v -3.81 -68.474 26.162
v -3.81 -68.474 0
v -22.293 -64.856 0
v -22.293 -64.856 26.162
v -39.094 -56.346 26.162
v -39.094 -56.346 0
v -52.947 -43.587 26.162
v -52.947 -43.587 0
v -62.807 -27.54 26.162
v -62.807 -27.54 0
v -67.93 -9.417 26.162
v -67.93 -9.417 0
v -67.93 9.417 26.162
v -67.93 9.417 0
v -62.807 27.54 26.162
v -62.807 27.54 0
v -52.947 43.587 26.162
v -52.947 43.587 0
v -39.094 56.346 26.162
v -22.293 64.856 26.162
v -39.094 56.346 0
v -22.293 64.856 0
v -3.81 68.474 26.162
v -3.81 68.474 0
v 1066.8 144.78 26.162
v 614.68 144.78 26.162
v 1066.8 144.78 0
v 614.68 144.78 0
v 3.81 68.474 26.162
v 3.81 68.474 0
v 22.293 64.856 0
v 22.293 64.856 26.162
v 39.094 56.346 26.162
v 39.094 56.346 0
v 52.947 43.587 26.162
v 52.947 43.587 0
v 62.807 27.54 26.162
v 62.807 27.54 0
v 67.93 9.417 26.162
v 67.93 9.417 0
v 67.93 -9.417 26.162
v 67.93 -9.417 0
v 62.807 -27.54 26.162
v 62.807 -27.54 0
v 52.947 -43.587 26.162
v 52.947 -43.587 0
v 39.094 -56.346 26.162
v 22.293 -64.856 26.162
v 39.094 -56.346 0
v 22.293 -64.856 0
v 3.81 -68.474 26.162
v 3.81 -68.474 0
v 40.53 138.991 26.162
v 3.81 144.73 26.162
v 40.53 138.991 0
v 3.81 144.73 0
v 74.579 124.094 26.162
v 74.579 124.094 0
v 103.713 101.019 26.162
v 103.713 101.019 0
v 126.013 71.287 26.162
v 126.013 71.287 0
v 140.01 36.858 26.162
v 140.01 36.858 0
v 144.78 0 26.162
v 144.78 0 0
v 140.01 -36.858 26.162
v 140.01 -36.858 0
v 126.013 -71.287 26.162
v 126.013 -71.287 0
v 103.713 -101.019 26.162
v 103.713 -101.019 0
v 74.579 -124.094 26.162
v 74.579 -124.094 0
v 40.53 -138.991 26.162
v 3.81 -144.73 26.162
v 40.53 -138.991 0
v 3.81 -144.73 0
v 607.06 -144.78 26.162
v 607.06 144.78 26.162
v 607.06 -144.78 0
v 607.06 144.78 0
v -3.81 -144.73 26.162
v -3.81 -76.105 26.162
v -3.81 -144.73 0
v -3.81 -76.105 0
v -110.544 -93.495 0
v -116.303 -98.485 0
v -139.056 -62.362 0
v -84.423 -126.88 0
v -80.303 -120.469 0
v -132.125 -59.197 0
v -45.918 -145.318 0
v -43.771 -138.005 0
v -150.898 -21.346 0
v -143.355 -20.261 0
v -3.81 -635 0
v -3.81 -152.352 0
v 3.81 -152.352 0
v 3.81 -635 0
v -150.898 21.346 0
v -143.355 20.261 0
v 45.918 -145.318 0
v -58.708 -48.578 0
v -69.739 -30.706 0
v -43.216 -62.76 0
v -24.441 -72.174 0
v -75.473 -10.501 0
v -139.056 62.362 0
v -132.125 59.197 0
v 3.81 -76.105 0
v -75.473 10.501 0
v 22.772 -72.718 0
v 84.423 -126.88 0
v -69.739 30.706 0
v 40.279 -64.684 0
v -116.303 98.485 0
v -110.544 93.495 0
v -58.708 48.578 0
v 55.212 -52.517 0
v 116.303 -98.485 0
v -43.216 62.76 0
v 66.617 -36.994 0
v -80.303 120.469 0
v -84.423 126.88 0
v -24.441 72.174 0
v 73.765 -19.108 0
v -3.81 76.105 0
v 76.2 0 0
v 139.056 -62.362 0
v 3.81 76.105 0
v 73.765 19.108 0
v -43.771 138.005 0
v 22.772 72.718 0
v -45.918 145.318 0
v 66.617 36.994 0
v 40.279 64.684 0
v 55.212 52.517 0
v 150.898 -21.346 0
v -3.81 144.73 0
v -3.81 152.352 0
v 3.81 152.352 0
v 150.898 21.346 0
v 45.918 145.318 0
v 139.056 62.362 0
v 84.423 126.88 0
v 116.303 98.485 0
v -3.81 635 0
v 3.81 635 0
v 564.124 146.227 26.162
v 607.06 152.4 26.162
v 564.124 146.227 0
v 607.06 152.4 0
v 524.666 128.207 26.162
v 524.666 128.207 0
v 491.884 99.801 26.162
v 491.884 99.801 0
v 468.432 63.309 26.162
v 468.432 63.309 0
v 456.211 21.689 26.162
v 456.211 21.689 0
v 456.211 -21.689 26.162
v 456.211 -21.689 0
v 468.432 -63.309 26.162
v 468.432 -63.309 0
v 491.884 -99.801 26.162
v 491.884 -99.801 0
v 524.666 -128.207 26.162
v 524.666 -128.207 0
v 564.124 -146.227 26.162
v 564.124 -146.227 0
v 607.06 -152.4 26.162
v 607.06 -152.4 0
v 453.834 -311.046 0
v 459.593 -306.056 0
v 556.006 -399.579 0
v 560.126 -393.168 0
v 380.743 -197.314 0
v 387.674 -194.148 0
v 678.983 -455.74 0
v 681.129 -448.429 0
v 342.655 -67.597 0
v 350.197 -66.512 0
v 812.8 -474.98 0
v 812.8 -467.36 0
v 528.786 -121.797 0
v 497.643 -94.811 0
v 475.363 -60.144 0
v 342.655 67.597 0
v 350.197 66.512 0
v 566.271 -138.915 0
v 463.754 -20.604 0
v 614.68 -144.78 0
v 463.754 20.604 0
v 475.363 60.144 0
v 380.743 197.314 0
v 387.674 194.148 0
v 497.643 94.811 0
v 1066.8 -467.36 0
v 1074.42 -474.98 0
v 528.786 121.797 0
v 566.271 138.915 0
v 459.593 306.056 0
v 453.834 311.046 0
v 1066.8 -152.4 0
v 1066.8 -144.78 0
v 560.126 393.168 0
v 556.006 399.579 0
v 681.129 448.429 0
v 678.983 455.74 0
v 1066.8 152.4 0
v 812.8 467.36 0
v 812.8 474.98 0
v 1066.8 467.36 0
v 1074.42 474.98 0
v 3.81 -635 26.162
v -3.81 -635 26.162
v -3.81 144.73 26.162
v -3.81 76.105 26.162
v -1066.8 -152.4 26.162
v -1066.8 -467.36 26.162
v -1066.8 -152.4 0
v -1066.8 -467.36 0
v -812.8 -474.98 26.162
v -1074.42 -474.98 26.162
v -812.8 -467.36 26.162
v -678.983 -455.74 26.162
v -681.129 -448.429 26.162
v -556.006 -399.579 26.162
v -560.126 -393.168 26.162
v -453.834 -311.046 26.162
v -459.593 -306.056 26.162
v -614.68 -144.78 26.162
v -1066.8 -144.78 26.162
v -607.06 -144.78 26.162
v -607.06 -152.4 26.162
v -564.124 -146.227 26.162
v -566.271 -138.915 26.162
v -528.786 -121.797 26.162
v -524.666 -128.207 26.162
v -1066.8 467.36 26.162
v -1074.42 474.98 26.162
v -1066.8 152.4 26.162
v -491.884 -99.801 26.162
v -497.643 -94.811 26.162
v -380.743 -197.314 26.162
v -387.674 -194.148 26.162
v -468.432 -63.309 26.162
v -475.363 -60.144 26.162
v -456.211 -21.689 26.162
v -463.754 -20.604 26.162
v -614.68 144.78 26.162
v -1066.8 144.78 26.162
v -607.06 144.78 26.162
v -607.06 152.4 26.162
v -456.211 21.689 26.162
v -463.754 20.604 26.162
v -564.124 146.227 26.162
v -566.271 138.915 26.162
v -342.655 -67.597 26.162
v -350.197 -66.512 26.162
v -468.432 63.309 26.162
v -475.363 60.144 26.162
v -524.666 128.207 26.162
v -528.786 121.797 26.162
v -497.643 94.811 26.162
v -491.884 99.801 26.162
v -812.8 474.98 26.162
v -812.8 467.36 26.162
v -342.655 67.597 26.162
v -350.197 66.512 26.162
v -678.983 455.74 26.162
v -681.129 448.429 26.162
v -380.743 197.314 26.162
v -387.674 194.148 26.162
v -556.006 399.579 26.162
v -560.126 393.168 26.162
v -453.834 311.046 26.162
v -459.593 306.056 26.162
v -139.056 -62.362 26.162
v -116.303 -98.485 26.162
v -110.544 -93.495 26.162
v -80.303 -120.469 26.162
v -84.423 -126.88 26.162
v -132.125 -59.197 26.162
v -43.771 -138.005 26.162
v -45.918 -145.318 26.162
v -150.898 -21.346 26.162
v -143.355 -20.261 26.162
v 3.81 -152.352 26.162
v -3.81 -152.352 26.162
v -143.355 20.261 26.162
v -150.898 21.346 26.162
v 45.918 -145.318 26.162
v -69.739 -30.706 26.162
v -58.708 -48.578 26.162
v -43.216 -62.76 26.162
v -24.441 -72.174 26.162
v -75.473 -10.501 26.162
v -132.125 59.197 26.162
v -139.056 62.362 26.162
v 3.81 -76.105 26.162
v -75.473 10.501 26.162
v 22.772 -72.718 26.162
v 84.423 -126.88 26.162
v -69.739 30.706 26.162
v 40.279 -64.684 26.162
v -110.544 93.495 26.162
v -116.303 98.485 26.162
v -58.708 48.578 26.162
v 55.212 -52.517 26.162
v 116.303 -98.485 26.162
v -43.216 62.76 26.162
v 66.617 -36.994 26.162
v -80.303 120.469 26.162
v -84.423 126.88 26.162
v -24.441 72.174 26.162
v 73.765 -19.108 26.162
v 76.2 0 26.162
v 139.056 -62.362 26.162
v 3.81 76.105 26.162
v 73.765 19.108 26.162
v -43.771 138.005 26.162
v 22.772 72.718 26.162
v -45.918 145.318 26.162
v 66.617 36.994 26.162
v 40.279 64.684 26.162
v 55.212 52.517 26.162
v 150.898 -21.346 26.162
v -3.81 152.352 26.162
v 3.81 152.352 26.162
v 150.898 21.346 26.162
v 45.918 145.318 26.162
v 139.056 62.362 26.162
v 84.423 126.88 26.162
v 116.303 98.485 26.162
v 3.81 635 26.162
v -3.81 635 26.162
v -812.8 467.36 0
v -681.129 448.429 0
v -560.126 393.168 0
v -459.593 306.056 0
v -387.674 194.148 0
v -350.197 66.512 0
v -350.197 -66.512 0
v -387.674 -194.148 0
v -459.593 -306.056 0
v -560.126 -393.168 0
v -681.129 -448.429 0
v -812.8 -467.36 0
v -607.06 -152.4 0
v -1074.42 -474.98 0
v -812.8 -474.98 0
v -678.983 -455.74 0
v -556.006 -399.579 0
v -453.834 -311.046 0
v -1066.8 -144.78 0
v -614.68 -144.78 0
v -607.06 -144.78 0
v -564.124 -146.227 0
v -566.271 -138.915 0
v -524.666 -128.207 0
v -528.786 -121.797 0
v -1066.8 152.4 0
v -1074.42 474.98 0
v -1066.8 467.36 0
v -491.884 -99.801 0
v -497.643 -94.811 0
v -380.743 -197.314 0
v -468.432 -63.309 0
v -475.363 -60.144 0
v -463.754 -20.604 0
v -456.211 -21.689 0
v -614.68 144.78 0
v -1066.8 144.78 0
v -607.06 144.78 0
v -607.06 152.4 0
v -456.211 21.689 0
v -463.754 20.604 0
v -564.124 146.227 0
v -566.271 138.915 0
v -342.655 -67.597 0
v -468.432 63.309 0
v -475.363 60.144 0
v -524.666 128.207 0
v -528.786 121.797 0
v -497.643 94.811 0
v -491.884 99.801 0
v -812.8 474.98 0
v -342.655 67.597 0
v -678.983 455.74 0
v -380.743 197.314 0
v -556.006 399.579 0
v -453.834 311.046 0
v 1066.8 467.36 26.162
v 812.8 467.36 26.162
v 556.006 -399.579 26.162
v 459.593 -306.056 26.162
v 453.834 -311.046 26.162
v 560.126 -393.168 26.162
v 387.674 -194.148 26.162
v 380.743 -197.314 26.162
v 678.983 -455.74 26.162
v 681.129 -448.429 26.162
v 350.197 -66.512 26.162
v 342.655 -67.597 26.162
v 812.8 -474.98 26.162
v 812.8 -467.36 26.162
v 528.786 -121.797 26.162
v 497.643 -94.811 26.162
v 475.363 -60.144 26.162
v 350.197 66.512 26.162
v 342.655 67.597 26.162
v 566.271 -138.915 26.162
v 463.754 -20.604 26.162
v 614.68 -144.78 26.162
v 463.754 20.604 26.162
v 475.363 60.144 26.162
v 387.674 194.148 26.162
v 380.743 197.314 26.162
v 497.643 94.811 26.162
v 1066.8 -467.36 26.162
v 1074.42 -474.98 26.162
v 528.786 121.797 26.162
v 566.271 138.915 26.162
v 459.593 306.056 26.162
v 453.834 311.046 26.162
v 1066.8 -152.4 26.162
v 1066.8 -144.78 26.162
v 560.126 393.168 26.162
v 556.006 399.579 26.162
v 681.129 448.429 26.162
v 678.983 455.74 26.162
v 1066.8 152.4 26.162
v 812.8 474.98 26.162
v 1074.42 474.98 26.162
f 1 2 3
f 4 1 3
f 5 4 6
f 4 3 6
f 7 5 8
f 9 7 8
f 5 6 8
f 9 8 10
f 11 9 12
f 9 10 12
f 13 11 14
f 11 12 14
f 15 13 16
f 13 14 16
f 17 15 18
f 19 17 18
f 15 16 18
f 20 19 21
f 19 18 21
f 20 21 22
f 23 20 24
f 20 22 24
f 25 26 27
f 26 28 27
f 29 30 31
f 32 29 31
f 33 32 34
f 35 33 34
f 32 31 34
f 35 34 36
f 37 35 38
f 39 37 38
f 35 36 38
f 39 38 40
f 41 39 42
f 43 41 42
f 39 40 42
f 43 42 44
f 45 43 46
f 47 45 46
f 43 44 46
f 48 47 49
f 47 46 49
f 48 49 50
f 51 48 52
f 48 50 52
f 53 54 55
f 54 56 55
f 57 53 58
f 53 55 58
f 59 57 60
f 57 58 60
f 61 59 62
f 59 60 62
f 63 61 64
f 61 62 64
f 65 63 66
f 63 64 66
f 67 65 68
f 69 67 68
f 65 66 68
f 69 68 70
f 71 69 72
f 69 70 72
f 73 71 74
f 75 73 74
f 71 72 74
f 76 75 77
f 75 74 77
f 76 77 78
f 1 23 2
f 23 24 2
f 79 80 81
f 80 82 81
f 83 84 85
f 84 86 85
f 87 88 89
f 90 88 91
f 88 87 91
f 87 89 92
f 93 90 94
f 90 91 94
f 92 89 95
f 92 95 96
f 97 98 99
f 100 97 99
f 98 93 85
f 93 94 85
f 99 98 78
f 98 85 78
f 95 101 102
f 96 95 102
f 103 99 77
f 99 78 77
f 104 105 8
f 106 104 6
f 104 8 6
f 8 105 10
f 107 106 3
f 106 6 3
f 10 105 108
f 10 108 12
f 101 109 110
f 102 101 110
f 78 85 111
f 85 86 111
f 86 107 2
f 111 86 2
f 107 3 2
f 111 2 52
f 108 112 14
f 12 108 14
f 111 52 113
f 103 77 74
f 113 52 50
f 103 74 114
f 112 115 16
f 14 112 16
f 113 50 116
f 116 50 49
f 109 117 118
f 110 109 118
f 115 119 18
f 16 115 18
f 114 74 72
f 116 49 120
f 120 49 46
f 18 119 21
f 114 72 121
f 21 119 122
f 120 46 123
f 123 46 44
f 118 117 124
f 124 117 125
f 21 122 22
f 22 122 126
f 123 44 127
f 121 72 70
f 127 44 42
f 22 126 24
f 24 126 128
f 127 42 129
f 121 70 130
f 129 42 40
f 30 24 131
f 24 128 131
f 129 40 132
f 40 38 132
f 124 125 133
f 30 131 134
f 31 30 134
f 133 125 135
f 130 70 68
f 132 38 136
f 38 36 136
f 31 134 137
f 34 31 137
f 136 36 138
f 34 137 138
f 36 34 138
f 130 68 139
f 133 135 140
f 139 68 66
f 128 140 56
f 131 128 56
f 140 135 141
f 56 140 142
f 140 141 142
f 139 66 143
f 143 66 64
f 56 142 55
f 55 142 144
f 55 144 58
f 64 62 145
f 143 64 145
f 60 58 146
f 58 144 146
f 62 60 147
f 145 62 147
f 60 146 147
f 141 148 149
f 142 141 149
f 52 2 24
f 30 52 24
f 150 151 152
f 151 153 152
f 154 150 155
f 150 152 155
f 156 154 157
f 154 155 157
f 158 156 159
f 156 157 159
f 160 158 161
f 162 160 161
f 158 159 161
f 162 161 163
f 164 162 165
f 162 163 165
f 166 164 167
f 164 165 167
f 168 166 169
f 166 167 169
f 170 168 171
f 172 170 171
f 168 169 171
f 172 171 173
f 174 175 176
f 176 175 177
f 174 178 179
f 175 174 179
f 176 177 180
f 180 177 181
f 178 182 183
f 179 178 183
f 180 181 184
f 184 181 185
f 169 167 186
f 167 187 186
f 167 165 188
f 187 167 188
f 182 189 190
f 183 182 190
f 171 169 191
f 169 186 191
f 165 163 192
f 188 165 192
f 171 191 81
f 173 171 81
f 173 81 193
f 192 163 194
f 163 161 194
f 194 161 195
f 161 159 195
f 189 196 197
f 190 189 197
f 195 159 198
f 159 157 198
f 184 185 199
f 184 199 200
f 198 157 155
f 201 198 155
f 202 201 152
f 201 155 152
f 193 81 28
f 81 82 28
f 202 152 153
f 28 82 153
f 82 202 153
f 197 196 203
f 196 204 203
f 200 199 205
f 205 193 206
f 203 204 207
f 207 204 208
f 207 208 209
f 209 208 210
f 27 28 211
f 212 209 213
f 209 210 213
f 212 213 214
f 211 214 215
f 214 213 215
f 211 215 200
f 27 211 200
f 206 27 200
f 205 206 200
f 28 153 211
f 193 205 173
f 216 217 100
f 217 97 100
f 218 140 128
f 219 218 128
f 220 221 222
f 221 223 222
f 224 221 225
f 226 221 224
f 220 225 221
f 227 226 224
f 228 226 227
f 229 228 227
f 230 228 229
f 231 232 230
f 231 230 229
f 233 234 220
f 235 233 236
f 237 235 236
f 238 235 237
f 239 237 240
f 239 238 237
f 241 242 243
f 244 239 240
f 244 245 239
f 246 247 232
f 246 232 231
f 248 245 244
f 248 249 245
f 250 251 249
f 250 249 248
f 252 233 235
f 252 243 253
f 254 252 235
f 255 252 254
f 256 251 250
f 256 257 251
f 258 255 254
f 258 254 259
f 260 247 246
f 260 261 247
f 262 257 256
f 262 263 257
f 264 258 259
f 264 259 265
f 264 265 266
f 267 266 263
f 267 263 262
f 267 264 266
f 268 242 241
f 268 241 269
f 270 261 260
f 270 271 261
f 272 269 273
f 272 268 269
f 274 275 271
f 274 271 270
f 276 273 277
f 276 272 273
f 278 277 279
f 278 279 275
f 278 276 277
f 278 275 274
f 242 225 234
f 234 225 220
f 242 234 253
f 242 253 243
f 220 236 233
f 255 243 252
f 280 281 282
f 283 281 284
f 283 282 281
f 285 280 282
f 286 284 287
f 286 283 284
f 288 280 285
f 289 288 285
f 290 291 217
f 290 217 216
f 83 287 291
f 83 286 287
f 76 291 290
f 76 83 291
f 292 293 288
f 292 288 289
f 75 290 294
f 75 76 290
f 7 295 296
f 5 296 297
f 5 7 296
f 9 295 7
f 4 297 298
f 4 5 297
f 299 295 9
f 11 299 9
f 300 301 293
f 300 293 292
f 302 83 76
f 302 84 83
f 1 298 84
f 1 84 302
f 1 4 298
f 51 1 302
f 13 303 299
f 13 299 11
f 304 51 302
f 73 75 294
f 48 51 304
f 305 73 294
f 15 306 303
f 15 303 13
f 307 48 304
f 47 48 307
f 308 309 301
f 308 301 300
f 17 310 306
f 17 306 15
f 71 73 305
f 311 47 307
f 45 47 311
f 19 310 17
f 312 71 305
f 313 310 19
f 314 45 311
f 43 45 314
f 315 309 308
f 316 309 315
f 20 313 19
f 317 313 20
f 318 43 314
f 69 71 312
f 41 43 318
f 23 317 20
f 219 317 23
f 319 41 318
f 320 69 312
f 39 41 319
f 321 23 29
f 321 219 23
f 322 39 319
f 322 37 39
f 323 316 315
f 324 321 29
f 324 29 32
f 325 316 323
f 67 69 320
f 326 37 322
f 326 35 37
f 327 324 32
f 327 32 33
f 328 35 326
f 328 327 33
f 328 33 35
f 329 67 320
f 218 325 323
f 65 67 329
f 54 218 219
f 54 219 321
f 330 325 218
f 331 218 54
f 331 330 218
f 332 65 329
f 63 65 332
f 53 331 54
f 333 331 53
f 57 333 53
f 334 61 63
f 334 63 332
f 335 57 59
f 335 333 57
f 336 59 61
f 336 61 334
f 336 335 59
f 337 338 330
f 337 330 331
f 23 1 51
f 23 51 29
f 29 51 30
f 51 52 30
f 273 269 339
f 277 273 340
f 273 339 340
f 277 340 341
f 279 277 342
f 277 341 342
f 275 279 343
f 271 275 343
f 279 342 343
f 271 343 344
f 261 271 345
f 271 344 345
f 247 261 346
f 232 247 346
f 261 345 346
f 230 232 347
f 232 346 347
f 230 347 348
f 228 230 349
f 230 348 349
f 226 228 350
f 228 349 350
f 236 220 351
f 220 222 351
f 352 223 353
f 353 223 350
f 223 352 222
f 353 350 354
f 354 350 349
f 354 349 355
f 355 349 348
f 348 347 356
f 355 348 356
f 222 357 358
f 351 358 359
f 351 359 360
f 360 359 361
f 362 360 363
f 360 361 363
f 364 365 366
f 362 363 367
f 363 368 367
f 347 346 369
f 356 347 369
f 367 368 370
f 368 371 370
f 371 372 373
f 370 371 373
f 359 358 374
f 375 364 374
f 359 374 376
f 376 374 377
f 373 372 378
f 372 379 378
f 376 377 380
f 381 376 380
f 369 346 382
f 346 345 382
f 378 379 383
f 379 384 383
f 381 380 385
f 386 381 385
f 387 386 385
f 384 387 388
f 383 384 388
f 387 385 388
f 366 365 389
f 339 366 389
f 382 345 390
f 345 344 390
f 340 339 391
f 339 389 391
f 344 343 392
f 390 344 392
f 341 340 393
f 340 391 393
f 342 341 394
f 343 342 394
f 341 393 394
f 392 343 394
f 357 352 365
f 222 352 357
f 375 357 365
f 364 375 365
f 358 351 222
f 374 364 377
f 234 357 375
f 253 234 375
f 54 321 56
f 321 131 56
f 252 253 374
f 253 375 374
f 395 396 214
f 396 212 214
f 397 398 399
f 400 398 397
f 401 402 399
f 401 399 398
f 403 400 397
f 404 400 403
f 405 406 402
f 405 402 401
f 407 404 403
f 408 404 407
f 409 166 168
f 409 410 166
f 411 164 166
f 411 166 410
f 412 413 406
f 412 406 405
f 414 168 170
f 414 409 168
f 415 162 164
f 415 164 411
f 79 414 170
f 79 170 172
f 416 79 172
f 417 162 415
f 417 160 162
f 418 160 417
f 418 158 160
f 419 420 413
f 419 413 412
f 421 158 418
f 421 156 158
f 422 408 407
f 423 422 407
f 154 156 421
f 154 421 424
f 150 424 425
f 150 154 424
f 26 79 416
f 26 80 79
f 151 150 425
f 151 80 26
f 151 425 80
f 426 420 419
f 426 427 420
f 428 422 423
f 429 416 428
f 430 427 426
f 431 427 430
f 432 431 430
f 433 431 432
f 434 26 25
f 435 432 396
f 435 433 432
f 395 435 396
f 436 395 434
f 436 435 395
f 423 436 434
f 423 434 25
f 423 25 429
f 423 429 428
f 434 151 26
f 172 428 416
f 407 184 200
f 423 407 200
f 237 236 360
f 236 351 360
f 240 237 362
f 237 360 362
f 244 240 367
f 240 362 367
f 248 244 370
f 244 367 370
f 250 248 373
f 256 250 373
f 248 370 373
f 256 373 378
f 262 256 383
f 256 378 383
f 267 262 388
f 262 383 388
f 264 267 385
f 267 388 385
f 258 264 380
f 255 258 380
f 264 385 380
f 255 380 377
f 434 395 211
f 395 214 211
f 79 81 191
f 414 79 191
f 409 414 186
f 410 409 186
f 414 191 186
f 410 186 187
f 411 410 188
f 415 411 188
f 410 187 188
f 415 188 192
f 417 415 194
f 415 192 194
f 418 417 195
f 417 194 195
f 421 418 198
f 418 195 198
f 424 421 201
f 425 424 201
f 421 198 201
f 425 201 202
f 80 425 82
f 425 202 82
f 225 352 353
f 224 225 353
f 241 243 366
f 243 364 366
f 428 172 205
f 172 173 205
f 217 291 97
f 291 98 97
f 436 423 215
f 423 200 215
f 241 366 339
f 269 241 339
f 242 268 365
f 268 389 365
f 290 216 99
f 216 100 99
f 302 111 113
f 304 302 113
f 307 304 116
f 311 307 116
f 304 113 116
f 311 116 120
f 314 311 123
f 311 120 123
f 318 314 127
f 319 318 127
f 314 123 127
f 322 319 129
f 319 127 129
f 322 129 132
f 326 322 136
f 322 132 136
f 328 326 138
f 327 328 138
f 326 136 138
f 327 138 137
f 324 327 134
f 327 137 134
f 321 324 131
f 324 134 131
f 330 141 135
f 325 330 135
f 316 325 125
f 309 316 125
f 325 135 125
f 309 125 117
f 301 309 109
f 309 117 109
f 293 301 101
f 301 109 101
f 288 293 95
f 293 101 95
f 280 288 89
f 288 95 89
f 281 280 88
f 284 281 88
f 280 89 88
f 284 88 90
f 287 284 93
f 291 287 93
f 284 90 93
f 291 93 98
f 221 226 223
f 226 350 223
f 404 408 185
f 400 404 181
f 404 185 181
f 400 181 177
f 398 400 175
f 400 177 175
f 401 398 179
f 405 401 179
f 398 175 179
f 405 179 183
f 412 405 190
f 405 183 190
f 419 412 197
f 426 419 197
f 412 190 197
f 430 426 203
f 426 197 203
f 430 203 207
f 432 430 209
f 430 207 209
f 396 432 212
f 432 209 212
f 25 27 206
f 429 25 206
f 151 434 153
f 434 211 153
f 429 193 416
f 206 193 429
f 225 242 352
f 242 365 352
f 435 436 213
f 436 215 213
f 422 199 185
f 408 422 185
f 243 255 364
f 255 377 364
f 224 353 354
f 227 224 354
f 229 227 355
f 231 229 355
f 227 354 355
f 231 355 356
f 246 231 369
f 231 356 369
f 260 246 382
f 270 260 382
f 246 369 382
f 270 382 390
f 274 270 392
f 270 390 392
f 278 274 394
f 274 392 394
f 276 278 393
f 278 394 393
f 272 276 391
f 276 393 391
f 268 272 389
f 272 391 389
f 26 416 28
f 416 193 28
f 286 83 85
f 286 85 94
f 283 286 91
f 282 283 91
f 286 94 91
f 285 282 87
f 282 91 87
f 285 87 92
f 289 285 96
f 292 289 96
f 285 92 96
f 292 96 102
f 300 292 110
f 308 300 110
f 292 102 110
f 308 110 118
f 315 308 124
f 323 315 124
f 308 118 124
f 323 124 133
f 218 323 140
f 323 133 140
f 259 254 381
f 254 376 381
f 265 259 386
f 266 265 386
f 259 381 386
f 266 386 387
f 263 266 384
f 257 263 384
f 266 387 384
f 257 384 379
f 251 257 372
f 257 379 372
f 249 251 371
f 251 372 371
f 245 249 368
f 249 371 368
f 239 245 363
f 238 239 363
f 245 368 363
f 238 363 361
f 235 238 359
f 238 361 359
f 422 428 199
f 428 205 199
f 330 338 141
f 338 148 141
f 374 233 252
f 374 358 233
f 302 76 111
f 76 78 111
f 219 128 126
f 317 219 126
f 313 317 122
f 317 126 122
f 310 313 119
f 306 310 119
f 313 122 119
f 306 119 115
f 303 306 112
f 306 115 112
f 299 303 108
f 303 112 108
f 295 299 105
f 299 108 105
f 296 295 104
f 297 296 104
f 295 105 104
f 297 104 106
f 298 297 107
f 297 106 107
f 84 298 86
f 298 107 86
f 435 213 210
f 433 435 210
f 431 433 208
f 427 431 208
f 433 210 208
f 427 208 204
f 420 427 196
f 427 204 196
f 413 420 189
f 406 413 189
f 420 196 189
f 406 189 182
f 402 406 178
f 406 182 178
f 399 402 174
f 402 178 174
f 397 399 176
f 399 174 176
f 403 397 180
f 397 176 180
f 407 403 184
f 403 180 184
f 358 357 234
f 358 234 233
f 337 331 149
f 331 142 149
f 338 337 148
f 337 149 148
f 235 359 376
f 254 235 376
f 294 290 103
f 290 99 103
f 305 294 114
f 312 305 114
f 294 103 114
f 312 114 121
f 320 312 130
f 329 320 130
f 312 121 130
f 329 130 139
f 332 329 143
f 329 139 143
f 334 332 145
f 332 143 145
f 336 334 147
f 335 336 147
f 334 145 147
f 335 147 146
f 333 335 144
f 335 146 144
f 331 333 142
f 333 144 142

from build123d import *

# Parameters (mm, degrees)
F0_W     = 254
F0_H     = 7.62
F0_W_2   = 7.62
F0_H_2   = 289.56
F0_W_3   = 452.12
F1_DEPTH = 0.762
F2_DEPTH = 25.4
F3_DEPTH = 25.4
F4_DEPTH = 25.4


with BuildPart() as f1:
    # F0 (on Top) → F1 (new body)
    with BuildSketch(Plane.XY):
        with BuildLine():
            Line((-1066.8, -467.36), (-1066.8, -474.98))
            Line((-1066.8, -474.98), (-812.8, -474.98))
            ThreePointArc((-812.8, -474.98), (-337.82, 0), (-812.8, 474.98))
            Line((-812.8, 474.98), (-812.8, 467.36))
            ThreePointArc((-812.8, 467.36), (-345.44, 0), (-812.8, -467.36))
            Line((-812.8, -467.36), (-1066.8, -467.36))
        make_face()
        with Locations((-939.8, 471.17)):
            Rectangle(F0_W, F0_H)
        with Locations((-610.87, 0)):
            Rectangle(F0_W_2, F0_H_2)
        with Locations((-840.74, 148.59)):
            Rectangle(F0_W_3, F0_H)
        with Locations((-610.87, 148.59)):
            Rectangle(F0_W_2, F0_H)
        with BuildLine():
            Line((-607.06, -144.78), (-607.06, -152.4))
            ThreePointArc((-607.06, -152.4), (-454.66, 0), (-607.06, 152.4))
            Line((-607.06, 152.4), (-607.06, 144.78))
            ThreePointArc((-607.06, 144.78), (-462.28, 0), (-607.06, -144.78))
        make_face()
        with Locations((-840.74, -148.59)):
            Rectangle(F0_W_3, F0_H)
        with Locations((-610.87, -148.59)):
            Rectangle(F0_W_2, F0_H)
        Polygon((-1074.42, -474.98), (-1066.8, -474.98), (-1066.8, -467.36), (-1066.8, -152.4), (-1066.8, -144.78), (-1066.8, 144.78), (-1066.8, 152.4), (-1066.8, 467.36), (-1066.8, 474.98), (-1074.42, 474.98), align=None)
    extrude(amount=F1_DEPTH)

    # F2 (add): a face of the model
    f2_faces = [f1.faces().sort_by_distance(p)[0] for p in [
        (-939.8, -468.5620830094, 0.762),
    ]]
    extrude(f2_faces, amount=F2_DEPTH)


with BuildPart() as f1b:
    # F0 (on Top) → F1, piece 2 (new body)
    with BuildSketch(Plane.XY):
        with BuildLine():
            ThreePointArc((-3.81, 76.1046903942), (-76.2, 0), (-3.81, -76.1046903942))
            Line((-3.81, -76.1046903942), (-3.81, -68.4740848789))
            ThreePointArc((-3.81, -68.4740848789), (-68.58, 0), (-3.81, 68.4740848789))
            Line((-3.81, 68.4740848789), (-3.81, 76.1046903942))
        make_face()
        with BuildLine():
            Line((3.81, -68.4740848789), (3.81, -76.1046903942))
            ThreePointArc((3.81, -76.1046903942), (55.212145403, -52.5172257455), (76.2, 0))
            ThreePointArc((76.2, 0), (55.212145403, 52.5172257455), (3.81, 76.1046903942))
            Line((3.81, 76.1046903942), (3.81, 68.4740848789))
            ThreePointArc((3.81, 68.4740848789), (49.8222149247, 47.1270973008), (68.58, 0))
            ThreePointArc((68.58, 0), (49.8222149247, -47.1270973008), (3.81, -68.4740848789))
        make_face()
        with BuildLine():
            ThreePointArc((3.81, 76.1046903942), (1.9055959646, 76.176168872), (0, 76.2))
            Line((0, 76.2), (0, 68.58))
            ThreePointArc((0, 68.58), (1.9057359479, 68.553516106), (3.81, 68.4740848789))
            Line((3.81, 68.4740848789), (3.81, 76.1046903942))
        make_face()
        with BuildLine():
            ThreePointArc((0, 76.2), (-1.9055959646, 76.176168872), (-3.81, 76.1046903942))
            Line((-3.81, 76.1046903942), (-3.81, 68.4740848789))
            ThreePointArc((-3.81, 68.4740848789), (-1.9057359479, 68.553516106), (0, 68.58))
            Line((0, 68.58), (0, 76.2))
        make_face()
        with BuildLine():
            ThreePointArc((-3.81, 152.3523675563), (-152.4, 0), (-3.81, -152.3523675563))
            Line((-3.81, -152.3523675563), (-3.81, -144.7298597388))
            ThreePointArc((-3.81, -144.7298597388), (-144.78, 0), (-3.81, 144.7298597388))
            Line((-3.81, 144.7298597388), (-3.81, 152.3523675563))
        make_face()
        with BuildLine():
            ThreePointArc((0, 152.4), (-1.9051488688, 152.3880914238), (-3.81, 152.3523675563))
            Line((-3.81, 152.3523675563), (-3.81, 144.7298597388))
            ThreePointArc((-3.81, 144.7298597388), (-1.9051649565, 144.767464392), (0, 144.78))
            Line((0, 144.78), (0, 152.4))
        make_face()
        with BuildLine():
            ThreePointArc((3.81, 152.3523675563), (1.9051488688, 152.3880914238), (0, 152.4))
            Line((0, 152.4), (0, 144.78))
            ThreePointArc((0, 144.78), (1.9051649565, 144.767464392), (3.81, 144.7298597388))
            Line((3.81, 144.7298597388), (3.81, 152.3523675563))
        make_face()
        with BuildLine():
            Line((3.81, -144.7298597388), (3.81, -152.3523675563))
            ThreePointArc((3.81, -152.3523675563), (109.1017965022, -106.4075091335), (152.4, 0))
            ThreePointArc((152.4, 0), (109.1017965022, 106.4075091335), (3.81, 152.3523675563))
            Line((3.81, 152.3523675563), (3.81, 144.7298597388))
            ThreePointArc((3.81, 144.7298597388), (103.7132108268, 101.0189007067), (144.78, 0))
            ThreePointArc((144.78, 0), (103.7132108268, -101.0189007067), (3.81, -144.7298597388))
        make_face()
        with BuildLine():
            Line((-3.81, -68.4740848789), (-3.81, -76.1046903942))
            ThreePointArc((-3.81, -76.1046903942), (-1.9055959646, -76.176168872), (0, -76.2))
            Line((0, -76.2), (0, -68.58))
            ThreePointArc((0, -68.58), (-1.9057359479, -68.553516106), (-3.81, -68.4740848789))
        make_face()
        with BuildLine():
            Line((0, -68.58), (0, -76.2))
            ThreePointArc((0, -76.2), (1.9055959646, -76.176168872), (3.81, -76.1046903942))
            Line((3.81, -76.1046903942), (3.81, -68.4740848789))
            ThreePointArc((3.81, -68.4740848789), (1.9057359479, -68.553516106), (0, -68.58))
        make_face()
        with BuildLine():
            Line((-3.81, -144.7298597388), (-3.81, -152.3523675563))
            ThreePointArc((-3.81, -152.3523675563), (-1.9051488688, -152.3880914238), (0, -152.4))
            Line((0, -152.4), (0, -144.78))
            ThreePointArc((0, -144.78), (-1.9051649565, -144.767464392), (-3.81, -144.7298597388))
        make_face()
        with BuildLine():
            Line((0, -144.78), (0, -152.4))
            ThreePointArc((0, -152.4), (1.9051488688, -152.3880914238), (3.81, -152.3523675563))
            Line((3.81, -152.3523675563), (3.81, -144.7298597388))
            ThreePointArc((3.81, -144.7298597388), (1.9051649565, -144.767464392), (0, -144.78))
        make_face()
        with BuildLine():
            Line((-3.81, 635), (-3.81, 152.3523675563))
            ThreePointArc((-3.81, 152.3523675563), (-1.9051488688, 152.3880914238), (0, 152.4))
            Line((0, 152.4), (0, 635))
            Line((0, 635), (-3.81, 635))
        make_face()
        with BuildLine():
            Line((0, 635), (0, 152.4))
            ThreePointArc((0, 152.4), (1.9051488688, 152.3880914238), (3.81, 152.3523675563))
            Line((3.81, 152.3523675563), (3.81, 635))
            Line((3.81, 635), (0, 635))
        make_face()
        with BuildLine():
            ThreePointArc((0, 144.78), (-1.9051649565, 144.767464392), (-3.81, 144.7298597388))
            Line((-3.81, 144.7298597388), (-3.81, 76.1046903942))
            ThreePointArc((-3.81, 76.1046903942), (-1.9055959646, 76.176168872), (0, 76.2))
            Line((0, 76.2), (0, 144.78))
        make_face()
        with BuildLine():
            ThreePointArc((3.81, 144.7298597388), (1.9051649565, 144.767464392), (0, 144.78))
            Line((0, 144.78), (0, 76.2))
            ThreePointArc((0, 76.2), (1.9055959646, 76.176168872), (3.81, 76.1046903942))
            Line((3.81, 76.1046903942), (3.81, 144.7298597388))
        make_face()
        with BuildLine():
            Line((-3.81, 68.4740848789), (-3.81, -68.4740848789))
            ThreePointArc((-3.81, -68.4740848789), (-1.9057359479, -68.553516106), (0, -68.58))
            Line((0, -68.58), (0, 68.58))
            ThreePointArc((0, 68.58), (-1.9057359479, 68.553516106), (-3.81, 68.4740848789))
        make_face()
        with BuildLine():
            Line((0, 68.58), (0, -68.58))
            ThreePointArc((0, -68.58), (1.9057359479, -68.553516106), (3.81, -68.4740848789))
            Line((3.81, -68.4740848789), (3.81, 68.4740848789))
            ThreePointArc((3.81, 68.4740848789), (1.9057359479, 68.553516106), (0, 68.58))
        make_face()
        with BuildLine():
            Line((-3.81, -76.1046903942), (-3.81, -144.7298597388))
            ThreePointArc((-3.81, -144.7298597388), (-1.9051649565, -144.767464392), (0, -144.78))
            Line((0, -144.78), (0, -76.2))
            ThreePointArc((0, -76.2), (-1.9055959646, -76.176168872), (-3.81, -76.1046903942))
        make_face()
        with BuildLine():
            Line((0, -76.2), (0, -144.78))
            ThreePointArc((0, -144.78), (1.9051649565, -144.767464392), (3.81, -144.7298597388))
            Line((3.81, -144.7298597388), (3.81, -76.1046903942))
            ThreePointArc((3.81, -76.1046903942), (1.9055959646, -76.176168872), (0, -76.2))
        make_face()
        with BuildLine():
            Line((-3.81, -152.3523675563), (-3.81, -635))
            Line((-3.81, -635), (0, -635))
            Line((0, -635), (0, -152.4))
            ThreePointArc((0, -152.4), (-1.9051488688, -152.3880914238), (-3.81, -152.3523675563))
        make_face()
        with BuildLine():
            Line((0, -152.4), (0, -635))
            Line((0, -635), (3.81, -635))
            Line((3.81, -635), (3.81, -152.3523675563))
            ThreePointArc((3.81, -152.3523675563), (1.9051488688, -152.3880914238), (0, -152.4))
        make_face()
    extrude(amount=F1_DEPTH)

    # F3 (add): a face of the model
    f3_faces = [f1b.faces().sort_by_distance(p)[0] for p in [
        (0, -3e-10, 0.762),
    ]]
    extrude(f3_faces, amount=F3_DEPTH)


with BuildPart() as f1c:
    # F0 (on Top) → F1, piece 3 (new body)
    with BuildSketch(Plane.XY):
        with BuildLine():
            Line((812.8, -474.98), (1066.8, -474.98))
            Line((1066.8, -474.98), (1066.8, -467.36))
            Line((1066.8, -467.36), (812.8, -467.36))
            ThreePointArc((812.8, -467.36), (345.44, 0), (812.8, 467.36))
            Line((812.8, 467.36), (1066.8, 467.36))
            Line((1066.8, 467.36), (1066.8, 474.98))
            Line((1066.8, 474.98), (812.8, 474.98))
            ThreePointArc((812.8, 474.98), (337.82, 0), (812.8, -474.98))
        make_face()
        with Locations((840.74, 148.59)):
            Rectangle(F0_W_3, F0_H)
        with Locations((610.87, 148.59)):
            Rectangle(F0_W_2, F0_H)
        with Locations((610.87, 0)):
            Rectangle(F0_W_2, F0_H_2)
        with BuildLine():
            ThreePointArc((607.06, 152.4), (454.66, 0), (607.06, -152.4))
            Line((607.06, -152.4), (607.06, -144.78))
            ThreePointArc((607.06, -144.78), (462.28, 0), (607.06, 144.78))
            Line((607.06, 144.78), (607.06, 152.4))
        make_face()
        with Locations((840.74, -148.59)):
            Rectangle(F0_W_3, F0_H)
        with Locations((610.87, -148.59)):
            Rectangle(F0_W_2, F0_H)
        Polygon((1066.8, -467.36), (1066.8, -474.98), (1074.42, -474.98), (1074.42, 474.98), (1066.8, 474.98), (1066.8, 467.36), (1066.8, 152.4), (1066.8, 144.78), (1066.8, -144.78), (1066.8, -152.4), align=None)
    extrude(amount=F1_DEPTH)

    # F4 (add): a face of the model
    f4_faces = [f1c.faces().sort_by_distance(p)[0] for p in [
        (943.61, -473.7779169906, 0.762),
    ]]
    extrude(f4_faces, amount=F4_DEPTH)


solid = Compound([f1.part, f1b.part, f1c.part])
